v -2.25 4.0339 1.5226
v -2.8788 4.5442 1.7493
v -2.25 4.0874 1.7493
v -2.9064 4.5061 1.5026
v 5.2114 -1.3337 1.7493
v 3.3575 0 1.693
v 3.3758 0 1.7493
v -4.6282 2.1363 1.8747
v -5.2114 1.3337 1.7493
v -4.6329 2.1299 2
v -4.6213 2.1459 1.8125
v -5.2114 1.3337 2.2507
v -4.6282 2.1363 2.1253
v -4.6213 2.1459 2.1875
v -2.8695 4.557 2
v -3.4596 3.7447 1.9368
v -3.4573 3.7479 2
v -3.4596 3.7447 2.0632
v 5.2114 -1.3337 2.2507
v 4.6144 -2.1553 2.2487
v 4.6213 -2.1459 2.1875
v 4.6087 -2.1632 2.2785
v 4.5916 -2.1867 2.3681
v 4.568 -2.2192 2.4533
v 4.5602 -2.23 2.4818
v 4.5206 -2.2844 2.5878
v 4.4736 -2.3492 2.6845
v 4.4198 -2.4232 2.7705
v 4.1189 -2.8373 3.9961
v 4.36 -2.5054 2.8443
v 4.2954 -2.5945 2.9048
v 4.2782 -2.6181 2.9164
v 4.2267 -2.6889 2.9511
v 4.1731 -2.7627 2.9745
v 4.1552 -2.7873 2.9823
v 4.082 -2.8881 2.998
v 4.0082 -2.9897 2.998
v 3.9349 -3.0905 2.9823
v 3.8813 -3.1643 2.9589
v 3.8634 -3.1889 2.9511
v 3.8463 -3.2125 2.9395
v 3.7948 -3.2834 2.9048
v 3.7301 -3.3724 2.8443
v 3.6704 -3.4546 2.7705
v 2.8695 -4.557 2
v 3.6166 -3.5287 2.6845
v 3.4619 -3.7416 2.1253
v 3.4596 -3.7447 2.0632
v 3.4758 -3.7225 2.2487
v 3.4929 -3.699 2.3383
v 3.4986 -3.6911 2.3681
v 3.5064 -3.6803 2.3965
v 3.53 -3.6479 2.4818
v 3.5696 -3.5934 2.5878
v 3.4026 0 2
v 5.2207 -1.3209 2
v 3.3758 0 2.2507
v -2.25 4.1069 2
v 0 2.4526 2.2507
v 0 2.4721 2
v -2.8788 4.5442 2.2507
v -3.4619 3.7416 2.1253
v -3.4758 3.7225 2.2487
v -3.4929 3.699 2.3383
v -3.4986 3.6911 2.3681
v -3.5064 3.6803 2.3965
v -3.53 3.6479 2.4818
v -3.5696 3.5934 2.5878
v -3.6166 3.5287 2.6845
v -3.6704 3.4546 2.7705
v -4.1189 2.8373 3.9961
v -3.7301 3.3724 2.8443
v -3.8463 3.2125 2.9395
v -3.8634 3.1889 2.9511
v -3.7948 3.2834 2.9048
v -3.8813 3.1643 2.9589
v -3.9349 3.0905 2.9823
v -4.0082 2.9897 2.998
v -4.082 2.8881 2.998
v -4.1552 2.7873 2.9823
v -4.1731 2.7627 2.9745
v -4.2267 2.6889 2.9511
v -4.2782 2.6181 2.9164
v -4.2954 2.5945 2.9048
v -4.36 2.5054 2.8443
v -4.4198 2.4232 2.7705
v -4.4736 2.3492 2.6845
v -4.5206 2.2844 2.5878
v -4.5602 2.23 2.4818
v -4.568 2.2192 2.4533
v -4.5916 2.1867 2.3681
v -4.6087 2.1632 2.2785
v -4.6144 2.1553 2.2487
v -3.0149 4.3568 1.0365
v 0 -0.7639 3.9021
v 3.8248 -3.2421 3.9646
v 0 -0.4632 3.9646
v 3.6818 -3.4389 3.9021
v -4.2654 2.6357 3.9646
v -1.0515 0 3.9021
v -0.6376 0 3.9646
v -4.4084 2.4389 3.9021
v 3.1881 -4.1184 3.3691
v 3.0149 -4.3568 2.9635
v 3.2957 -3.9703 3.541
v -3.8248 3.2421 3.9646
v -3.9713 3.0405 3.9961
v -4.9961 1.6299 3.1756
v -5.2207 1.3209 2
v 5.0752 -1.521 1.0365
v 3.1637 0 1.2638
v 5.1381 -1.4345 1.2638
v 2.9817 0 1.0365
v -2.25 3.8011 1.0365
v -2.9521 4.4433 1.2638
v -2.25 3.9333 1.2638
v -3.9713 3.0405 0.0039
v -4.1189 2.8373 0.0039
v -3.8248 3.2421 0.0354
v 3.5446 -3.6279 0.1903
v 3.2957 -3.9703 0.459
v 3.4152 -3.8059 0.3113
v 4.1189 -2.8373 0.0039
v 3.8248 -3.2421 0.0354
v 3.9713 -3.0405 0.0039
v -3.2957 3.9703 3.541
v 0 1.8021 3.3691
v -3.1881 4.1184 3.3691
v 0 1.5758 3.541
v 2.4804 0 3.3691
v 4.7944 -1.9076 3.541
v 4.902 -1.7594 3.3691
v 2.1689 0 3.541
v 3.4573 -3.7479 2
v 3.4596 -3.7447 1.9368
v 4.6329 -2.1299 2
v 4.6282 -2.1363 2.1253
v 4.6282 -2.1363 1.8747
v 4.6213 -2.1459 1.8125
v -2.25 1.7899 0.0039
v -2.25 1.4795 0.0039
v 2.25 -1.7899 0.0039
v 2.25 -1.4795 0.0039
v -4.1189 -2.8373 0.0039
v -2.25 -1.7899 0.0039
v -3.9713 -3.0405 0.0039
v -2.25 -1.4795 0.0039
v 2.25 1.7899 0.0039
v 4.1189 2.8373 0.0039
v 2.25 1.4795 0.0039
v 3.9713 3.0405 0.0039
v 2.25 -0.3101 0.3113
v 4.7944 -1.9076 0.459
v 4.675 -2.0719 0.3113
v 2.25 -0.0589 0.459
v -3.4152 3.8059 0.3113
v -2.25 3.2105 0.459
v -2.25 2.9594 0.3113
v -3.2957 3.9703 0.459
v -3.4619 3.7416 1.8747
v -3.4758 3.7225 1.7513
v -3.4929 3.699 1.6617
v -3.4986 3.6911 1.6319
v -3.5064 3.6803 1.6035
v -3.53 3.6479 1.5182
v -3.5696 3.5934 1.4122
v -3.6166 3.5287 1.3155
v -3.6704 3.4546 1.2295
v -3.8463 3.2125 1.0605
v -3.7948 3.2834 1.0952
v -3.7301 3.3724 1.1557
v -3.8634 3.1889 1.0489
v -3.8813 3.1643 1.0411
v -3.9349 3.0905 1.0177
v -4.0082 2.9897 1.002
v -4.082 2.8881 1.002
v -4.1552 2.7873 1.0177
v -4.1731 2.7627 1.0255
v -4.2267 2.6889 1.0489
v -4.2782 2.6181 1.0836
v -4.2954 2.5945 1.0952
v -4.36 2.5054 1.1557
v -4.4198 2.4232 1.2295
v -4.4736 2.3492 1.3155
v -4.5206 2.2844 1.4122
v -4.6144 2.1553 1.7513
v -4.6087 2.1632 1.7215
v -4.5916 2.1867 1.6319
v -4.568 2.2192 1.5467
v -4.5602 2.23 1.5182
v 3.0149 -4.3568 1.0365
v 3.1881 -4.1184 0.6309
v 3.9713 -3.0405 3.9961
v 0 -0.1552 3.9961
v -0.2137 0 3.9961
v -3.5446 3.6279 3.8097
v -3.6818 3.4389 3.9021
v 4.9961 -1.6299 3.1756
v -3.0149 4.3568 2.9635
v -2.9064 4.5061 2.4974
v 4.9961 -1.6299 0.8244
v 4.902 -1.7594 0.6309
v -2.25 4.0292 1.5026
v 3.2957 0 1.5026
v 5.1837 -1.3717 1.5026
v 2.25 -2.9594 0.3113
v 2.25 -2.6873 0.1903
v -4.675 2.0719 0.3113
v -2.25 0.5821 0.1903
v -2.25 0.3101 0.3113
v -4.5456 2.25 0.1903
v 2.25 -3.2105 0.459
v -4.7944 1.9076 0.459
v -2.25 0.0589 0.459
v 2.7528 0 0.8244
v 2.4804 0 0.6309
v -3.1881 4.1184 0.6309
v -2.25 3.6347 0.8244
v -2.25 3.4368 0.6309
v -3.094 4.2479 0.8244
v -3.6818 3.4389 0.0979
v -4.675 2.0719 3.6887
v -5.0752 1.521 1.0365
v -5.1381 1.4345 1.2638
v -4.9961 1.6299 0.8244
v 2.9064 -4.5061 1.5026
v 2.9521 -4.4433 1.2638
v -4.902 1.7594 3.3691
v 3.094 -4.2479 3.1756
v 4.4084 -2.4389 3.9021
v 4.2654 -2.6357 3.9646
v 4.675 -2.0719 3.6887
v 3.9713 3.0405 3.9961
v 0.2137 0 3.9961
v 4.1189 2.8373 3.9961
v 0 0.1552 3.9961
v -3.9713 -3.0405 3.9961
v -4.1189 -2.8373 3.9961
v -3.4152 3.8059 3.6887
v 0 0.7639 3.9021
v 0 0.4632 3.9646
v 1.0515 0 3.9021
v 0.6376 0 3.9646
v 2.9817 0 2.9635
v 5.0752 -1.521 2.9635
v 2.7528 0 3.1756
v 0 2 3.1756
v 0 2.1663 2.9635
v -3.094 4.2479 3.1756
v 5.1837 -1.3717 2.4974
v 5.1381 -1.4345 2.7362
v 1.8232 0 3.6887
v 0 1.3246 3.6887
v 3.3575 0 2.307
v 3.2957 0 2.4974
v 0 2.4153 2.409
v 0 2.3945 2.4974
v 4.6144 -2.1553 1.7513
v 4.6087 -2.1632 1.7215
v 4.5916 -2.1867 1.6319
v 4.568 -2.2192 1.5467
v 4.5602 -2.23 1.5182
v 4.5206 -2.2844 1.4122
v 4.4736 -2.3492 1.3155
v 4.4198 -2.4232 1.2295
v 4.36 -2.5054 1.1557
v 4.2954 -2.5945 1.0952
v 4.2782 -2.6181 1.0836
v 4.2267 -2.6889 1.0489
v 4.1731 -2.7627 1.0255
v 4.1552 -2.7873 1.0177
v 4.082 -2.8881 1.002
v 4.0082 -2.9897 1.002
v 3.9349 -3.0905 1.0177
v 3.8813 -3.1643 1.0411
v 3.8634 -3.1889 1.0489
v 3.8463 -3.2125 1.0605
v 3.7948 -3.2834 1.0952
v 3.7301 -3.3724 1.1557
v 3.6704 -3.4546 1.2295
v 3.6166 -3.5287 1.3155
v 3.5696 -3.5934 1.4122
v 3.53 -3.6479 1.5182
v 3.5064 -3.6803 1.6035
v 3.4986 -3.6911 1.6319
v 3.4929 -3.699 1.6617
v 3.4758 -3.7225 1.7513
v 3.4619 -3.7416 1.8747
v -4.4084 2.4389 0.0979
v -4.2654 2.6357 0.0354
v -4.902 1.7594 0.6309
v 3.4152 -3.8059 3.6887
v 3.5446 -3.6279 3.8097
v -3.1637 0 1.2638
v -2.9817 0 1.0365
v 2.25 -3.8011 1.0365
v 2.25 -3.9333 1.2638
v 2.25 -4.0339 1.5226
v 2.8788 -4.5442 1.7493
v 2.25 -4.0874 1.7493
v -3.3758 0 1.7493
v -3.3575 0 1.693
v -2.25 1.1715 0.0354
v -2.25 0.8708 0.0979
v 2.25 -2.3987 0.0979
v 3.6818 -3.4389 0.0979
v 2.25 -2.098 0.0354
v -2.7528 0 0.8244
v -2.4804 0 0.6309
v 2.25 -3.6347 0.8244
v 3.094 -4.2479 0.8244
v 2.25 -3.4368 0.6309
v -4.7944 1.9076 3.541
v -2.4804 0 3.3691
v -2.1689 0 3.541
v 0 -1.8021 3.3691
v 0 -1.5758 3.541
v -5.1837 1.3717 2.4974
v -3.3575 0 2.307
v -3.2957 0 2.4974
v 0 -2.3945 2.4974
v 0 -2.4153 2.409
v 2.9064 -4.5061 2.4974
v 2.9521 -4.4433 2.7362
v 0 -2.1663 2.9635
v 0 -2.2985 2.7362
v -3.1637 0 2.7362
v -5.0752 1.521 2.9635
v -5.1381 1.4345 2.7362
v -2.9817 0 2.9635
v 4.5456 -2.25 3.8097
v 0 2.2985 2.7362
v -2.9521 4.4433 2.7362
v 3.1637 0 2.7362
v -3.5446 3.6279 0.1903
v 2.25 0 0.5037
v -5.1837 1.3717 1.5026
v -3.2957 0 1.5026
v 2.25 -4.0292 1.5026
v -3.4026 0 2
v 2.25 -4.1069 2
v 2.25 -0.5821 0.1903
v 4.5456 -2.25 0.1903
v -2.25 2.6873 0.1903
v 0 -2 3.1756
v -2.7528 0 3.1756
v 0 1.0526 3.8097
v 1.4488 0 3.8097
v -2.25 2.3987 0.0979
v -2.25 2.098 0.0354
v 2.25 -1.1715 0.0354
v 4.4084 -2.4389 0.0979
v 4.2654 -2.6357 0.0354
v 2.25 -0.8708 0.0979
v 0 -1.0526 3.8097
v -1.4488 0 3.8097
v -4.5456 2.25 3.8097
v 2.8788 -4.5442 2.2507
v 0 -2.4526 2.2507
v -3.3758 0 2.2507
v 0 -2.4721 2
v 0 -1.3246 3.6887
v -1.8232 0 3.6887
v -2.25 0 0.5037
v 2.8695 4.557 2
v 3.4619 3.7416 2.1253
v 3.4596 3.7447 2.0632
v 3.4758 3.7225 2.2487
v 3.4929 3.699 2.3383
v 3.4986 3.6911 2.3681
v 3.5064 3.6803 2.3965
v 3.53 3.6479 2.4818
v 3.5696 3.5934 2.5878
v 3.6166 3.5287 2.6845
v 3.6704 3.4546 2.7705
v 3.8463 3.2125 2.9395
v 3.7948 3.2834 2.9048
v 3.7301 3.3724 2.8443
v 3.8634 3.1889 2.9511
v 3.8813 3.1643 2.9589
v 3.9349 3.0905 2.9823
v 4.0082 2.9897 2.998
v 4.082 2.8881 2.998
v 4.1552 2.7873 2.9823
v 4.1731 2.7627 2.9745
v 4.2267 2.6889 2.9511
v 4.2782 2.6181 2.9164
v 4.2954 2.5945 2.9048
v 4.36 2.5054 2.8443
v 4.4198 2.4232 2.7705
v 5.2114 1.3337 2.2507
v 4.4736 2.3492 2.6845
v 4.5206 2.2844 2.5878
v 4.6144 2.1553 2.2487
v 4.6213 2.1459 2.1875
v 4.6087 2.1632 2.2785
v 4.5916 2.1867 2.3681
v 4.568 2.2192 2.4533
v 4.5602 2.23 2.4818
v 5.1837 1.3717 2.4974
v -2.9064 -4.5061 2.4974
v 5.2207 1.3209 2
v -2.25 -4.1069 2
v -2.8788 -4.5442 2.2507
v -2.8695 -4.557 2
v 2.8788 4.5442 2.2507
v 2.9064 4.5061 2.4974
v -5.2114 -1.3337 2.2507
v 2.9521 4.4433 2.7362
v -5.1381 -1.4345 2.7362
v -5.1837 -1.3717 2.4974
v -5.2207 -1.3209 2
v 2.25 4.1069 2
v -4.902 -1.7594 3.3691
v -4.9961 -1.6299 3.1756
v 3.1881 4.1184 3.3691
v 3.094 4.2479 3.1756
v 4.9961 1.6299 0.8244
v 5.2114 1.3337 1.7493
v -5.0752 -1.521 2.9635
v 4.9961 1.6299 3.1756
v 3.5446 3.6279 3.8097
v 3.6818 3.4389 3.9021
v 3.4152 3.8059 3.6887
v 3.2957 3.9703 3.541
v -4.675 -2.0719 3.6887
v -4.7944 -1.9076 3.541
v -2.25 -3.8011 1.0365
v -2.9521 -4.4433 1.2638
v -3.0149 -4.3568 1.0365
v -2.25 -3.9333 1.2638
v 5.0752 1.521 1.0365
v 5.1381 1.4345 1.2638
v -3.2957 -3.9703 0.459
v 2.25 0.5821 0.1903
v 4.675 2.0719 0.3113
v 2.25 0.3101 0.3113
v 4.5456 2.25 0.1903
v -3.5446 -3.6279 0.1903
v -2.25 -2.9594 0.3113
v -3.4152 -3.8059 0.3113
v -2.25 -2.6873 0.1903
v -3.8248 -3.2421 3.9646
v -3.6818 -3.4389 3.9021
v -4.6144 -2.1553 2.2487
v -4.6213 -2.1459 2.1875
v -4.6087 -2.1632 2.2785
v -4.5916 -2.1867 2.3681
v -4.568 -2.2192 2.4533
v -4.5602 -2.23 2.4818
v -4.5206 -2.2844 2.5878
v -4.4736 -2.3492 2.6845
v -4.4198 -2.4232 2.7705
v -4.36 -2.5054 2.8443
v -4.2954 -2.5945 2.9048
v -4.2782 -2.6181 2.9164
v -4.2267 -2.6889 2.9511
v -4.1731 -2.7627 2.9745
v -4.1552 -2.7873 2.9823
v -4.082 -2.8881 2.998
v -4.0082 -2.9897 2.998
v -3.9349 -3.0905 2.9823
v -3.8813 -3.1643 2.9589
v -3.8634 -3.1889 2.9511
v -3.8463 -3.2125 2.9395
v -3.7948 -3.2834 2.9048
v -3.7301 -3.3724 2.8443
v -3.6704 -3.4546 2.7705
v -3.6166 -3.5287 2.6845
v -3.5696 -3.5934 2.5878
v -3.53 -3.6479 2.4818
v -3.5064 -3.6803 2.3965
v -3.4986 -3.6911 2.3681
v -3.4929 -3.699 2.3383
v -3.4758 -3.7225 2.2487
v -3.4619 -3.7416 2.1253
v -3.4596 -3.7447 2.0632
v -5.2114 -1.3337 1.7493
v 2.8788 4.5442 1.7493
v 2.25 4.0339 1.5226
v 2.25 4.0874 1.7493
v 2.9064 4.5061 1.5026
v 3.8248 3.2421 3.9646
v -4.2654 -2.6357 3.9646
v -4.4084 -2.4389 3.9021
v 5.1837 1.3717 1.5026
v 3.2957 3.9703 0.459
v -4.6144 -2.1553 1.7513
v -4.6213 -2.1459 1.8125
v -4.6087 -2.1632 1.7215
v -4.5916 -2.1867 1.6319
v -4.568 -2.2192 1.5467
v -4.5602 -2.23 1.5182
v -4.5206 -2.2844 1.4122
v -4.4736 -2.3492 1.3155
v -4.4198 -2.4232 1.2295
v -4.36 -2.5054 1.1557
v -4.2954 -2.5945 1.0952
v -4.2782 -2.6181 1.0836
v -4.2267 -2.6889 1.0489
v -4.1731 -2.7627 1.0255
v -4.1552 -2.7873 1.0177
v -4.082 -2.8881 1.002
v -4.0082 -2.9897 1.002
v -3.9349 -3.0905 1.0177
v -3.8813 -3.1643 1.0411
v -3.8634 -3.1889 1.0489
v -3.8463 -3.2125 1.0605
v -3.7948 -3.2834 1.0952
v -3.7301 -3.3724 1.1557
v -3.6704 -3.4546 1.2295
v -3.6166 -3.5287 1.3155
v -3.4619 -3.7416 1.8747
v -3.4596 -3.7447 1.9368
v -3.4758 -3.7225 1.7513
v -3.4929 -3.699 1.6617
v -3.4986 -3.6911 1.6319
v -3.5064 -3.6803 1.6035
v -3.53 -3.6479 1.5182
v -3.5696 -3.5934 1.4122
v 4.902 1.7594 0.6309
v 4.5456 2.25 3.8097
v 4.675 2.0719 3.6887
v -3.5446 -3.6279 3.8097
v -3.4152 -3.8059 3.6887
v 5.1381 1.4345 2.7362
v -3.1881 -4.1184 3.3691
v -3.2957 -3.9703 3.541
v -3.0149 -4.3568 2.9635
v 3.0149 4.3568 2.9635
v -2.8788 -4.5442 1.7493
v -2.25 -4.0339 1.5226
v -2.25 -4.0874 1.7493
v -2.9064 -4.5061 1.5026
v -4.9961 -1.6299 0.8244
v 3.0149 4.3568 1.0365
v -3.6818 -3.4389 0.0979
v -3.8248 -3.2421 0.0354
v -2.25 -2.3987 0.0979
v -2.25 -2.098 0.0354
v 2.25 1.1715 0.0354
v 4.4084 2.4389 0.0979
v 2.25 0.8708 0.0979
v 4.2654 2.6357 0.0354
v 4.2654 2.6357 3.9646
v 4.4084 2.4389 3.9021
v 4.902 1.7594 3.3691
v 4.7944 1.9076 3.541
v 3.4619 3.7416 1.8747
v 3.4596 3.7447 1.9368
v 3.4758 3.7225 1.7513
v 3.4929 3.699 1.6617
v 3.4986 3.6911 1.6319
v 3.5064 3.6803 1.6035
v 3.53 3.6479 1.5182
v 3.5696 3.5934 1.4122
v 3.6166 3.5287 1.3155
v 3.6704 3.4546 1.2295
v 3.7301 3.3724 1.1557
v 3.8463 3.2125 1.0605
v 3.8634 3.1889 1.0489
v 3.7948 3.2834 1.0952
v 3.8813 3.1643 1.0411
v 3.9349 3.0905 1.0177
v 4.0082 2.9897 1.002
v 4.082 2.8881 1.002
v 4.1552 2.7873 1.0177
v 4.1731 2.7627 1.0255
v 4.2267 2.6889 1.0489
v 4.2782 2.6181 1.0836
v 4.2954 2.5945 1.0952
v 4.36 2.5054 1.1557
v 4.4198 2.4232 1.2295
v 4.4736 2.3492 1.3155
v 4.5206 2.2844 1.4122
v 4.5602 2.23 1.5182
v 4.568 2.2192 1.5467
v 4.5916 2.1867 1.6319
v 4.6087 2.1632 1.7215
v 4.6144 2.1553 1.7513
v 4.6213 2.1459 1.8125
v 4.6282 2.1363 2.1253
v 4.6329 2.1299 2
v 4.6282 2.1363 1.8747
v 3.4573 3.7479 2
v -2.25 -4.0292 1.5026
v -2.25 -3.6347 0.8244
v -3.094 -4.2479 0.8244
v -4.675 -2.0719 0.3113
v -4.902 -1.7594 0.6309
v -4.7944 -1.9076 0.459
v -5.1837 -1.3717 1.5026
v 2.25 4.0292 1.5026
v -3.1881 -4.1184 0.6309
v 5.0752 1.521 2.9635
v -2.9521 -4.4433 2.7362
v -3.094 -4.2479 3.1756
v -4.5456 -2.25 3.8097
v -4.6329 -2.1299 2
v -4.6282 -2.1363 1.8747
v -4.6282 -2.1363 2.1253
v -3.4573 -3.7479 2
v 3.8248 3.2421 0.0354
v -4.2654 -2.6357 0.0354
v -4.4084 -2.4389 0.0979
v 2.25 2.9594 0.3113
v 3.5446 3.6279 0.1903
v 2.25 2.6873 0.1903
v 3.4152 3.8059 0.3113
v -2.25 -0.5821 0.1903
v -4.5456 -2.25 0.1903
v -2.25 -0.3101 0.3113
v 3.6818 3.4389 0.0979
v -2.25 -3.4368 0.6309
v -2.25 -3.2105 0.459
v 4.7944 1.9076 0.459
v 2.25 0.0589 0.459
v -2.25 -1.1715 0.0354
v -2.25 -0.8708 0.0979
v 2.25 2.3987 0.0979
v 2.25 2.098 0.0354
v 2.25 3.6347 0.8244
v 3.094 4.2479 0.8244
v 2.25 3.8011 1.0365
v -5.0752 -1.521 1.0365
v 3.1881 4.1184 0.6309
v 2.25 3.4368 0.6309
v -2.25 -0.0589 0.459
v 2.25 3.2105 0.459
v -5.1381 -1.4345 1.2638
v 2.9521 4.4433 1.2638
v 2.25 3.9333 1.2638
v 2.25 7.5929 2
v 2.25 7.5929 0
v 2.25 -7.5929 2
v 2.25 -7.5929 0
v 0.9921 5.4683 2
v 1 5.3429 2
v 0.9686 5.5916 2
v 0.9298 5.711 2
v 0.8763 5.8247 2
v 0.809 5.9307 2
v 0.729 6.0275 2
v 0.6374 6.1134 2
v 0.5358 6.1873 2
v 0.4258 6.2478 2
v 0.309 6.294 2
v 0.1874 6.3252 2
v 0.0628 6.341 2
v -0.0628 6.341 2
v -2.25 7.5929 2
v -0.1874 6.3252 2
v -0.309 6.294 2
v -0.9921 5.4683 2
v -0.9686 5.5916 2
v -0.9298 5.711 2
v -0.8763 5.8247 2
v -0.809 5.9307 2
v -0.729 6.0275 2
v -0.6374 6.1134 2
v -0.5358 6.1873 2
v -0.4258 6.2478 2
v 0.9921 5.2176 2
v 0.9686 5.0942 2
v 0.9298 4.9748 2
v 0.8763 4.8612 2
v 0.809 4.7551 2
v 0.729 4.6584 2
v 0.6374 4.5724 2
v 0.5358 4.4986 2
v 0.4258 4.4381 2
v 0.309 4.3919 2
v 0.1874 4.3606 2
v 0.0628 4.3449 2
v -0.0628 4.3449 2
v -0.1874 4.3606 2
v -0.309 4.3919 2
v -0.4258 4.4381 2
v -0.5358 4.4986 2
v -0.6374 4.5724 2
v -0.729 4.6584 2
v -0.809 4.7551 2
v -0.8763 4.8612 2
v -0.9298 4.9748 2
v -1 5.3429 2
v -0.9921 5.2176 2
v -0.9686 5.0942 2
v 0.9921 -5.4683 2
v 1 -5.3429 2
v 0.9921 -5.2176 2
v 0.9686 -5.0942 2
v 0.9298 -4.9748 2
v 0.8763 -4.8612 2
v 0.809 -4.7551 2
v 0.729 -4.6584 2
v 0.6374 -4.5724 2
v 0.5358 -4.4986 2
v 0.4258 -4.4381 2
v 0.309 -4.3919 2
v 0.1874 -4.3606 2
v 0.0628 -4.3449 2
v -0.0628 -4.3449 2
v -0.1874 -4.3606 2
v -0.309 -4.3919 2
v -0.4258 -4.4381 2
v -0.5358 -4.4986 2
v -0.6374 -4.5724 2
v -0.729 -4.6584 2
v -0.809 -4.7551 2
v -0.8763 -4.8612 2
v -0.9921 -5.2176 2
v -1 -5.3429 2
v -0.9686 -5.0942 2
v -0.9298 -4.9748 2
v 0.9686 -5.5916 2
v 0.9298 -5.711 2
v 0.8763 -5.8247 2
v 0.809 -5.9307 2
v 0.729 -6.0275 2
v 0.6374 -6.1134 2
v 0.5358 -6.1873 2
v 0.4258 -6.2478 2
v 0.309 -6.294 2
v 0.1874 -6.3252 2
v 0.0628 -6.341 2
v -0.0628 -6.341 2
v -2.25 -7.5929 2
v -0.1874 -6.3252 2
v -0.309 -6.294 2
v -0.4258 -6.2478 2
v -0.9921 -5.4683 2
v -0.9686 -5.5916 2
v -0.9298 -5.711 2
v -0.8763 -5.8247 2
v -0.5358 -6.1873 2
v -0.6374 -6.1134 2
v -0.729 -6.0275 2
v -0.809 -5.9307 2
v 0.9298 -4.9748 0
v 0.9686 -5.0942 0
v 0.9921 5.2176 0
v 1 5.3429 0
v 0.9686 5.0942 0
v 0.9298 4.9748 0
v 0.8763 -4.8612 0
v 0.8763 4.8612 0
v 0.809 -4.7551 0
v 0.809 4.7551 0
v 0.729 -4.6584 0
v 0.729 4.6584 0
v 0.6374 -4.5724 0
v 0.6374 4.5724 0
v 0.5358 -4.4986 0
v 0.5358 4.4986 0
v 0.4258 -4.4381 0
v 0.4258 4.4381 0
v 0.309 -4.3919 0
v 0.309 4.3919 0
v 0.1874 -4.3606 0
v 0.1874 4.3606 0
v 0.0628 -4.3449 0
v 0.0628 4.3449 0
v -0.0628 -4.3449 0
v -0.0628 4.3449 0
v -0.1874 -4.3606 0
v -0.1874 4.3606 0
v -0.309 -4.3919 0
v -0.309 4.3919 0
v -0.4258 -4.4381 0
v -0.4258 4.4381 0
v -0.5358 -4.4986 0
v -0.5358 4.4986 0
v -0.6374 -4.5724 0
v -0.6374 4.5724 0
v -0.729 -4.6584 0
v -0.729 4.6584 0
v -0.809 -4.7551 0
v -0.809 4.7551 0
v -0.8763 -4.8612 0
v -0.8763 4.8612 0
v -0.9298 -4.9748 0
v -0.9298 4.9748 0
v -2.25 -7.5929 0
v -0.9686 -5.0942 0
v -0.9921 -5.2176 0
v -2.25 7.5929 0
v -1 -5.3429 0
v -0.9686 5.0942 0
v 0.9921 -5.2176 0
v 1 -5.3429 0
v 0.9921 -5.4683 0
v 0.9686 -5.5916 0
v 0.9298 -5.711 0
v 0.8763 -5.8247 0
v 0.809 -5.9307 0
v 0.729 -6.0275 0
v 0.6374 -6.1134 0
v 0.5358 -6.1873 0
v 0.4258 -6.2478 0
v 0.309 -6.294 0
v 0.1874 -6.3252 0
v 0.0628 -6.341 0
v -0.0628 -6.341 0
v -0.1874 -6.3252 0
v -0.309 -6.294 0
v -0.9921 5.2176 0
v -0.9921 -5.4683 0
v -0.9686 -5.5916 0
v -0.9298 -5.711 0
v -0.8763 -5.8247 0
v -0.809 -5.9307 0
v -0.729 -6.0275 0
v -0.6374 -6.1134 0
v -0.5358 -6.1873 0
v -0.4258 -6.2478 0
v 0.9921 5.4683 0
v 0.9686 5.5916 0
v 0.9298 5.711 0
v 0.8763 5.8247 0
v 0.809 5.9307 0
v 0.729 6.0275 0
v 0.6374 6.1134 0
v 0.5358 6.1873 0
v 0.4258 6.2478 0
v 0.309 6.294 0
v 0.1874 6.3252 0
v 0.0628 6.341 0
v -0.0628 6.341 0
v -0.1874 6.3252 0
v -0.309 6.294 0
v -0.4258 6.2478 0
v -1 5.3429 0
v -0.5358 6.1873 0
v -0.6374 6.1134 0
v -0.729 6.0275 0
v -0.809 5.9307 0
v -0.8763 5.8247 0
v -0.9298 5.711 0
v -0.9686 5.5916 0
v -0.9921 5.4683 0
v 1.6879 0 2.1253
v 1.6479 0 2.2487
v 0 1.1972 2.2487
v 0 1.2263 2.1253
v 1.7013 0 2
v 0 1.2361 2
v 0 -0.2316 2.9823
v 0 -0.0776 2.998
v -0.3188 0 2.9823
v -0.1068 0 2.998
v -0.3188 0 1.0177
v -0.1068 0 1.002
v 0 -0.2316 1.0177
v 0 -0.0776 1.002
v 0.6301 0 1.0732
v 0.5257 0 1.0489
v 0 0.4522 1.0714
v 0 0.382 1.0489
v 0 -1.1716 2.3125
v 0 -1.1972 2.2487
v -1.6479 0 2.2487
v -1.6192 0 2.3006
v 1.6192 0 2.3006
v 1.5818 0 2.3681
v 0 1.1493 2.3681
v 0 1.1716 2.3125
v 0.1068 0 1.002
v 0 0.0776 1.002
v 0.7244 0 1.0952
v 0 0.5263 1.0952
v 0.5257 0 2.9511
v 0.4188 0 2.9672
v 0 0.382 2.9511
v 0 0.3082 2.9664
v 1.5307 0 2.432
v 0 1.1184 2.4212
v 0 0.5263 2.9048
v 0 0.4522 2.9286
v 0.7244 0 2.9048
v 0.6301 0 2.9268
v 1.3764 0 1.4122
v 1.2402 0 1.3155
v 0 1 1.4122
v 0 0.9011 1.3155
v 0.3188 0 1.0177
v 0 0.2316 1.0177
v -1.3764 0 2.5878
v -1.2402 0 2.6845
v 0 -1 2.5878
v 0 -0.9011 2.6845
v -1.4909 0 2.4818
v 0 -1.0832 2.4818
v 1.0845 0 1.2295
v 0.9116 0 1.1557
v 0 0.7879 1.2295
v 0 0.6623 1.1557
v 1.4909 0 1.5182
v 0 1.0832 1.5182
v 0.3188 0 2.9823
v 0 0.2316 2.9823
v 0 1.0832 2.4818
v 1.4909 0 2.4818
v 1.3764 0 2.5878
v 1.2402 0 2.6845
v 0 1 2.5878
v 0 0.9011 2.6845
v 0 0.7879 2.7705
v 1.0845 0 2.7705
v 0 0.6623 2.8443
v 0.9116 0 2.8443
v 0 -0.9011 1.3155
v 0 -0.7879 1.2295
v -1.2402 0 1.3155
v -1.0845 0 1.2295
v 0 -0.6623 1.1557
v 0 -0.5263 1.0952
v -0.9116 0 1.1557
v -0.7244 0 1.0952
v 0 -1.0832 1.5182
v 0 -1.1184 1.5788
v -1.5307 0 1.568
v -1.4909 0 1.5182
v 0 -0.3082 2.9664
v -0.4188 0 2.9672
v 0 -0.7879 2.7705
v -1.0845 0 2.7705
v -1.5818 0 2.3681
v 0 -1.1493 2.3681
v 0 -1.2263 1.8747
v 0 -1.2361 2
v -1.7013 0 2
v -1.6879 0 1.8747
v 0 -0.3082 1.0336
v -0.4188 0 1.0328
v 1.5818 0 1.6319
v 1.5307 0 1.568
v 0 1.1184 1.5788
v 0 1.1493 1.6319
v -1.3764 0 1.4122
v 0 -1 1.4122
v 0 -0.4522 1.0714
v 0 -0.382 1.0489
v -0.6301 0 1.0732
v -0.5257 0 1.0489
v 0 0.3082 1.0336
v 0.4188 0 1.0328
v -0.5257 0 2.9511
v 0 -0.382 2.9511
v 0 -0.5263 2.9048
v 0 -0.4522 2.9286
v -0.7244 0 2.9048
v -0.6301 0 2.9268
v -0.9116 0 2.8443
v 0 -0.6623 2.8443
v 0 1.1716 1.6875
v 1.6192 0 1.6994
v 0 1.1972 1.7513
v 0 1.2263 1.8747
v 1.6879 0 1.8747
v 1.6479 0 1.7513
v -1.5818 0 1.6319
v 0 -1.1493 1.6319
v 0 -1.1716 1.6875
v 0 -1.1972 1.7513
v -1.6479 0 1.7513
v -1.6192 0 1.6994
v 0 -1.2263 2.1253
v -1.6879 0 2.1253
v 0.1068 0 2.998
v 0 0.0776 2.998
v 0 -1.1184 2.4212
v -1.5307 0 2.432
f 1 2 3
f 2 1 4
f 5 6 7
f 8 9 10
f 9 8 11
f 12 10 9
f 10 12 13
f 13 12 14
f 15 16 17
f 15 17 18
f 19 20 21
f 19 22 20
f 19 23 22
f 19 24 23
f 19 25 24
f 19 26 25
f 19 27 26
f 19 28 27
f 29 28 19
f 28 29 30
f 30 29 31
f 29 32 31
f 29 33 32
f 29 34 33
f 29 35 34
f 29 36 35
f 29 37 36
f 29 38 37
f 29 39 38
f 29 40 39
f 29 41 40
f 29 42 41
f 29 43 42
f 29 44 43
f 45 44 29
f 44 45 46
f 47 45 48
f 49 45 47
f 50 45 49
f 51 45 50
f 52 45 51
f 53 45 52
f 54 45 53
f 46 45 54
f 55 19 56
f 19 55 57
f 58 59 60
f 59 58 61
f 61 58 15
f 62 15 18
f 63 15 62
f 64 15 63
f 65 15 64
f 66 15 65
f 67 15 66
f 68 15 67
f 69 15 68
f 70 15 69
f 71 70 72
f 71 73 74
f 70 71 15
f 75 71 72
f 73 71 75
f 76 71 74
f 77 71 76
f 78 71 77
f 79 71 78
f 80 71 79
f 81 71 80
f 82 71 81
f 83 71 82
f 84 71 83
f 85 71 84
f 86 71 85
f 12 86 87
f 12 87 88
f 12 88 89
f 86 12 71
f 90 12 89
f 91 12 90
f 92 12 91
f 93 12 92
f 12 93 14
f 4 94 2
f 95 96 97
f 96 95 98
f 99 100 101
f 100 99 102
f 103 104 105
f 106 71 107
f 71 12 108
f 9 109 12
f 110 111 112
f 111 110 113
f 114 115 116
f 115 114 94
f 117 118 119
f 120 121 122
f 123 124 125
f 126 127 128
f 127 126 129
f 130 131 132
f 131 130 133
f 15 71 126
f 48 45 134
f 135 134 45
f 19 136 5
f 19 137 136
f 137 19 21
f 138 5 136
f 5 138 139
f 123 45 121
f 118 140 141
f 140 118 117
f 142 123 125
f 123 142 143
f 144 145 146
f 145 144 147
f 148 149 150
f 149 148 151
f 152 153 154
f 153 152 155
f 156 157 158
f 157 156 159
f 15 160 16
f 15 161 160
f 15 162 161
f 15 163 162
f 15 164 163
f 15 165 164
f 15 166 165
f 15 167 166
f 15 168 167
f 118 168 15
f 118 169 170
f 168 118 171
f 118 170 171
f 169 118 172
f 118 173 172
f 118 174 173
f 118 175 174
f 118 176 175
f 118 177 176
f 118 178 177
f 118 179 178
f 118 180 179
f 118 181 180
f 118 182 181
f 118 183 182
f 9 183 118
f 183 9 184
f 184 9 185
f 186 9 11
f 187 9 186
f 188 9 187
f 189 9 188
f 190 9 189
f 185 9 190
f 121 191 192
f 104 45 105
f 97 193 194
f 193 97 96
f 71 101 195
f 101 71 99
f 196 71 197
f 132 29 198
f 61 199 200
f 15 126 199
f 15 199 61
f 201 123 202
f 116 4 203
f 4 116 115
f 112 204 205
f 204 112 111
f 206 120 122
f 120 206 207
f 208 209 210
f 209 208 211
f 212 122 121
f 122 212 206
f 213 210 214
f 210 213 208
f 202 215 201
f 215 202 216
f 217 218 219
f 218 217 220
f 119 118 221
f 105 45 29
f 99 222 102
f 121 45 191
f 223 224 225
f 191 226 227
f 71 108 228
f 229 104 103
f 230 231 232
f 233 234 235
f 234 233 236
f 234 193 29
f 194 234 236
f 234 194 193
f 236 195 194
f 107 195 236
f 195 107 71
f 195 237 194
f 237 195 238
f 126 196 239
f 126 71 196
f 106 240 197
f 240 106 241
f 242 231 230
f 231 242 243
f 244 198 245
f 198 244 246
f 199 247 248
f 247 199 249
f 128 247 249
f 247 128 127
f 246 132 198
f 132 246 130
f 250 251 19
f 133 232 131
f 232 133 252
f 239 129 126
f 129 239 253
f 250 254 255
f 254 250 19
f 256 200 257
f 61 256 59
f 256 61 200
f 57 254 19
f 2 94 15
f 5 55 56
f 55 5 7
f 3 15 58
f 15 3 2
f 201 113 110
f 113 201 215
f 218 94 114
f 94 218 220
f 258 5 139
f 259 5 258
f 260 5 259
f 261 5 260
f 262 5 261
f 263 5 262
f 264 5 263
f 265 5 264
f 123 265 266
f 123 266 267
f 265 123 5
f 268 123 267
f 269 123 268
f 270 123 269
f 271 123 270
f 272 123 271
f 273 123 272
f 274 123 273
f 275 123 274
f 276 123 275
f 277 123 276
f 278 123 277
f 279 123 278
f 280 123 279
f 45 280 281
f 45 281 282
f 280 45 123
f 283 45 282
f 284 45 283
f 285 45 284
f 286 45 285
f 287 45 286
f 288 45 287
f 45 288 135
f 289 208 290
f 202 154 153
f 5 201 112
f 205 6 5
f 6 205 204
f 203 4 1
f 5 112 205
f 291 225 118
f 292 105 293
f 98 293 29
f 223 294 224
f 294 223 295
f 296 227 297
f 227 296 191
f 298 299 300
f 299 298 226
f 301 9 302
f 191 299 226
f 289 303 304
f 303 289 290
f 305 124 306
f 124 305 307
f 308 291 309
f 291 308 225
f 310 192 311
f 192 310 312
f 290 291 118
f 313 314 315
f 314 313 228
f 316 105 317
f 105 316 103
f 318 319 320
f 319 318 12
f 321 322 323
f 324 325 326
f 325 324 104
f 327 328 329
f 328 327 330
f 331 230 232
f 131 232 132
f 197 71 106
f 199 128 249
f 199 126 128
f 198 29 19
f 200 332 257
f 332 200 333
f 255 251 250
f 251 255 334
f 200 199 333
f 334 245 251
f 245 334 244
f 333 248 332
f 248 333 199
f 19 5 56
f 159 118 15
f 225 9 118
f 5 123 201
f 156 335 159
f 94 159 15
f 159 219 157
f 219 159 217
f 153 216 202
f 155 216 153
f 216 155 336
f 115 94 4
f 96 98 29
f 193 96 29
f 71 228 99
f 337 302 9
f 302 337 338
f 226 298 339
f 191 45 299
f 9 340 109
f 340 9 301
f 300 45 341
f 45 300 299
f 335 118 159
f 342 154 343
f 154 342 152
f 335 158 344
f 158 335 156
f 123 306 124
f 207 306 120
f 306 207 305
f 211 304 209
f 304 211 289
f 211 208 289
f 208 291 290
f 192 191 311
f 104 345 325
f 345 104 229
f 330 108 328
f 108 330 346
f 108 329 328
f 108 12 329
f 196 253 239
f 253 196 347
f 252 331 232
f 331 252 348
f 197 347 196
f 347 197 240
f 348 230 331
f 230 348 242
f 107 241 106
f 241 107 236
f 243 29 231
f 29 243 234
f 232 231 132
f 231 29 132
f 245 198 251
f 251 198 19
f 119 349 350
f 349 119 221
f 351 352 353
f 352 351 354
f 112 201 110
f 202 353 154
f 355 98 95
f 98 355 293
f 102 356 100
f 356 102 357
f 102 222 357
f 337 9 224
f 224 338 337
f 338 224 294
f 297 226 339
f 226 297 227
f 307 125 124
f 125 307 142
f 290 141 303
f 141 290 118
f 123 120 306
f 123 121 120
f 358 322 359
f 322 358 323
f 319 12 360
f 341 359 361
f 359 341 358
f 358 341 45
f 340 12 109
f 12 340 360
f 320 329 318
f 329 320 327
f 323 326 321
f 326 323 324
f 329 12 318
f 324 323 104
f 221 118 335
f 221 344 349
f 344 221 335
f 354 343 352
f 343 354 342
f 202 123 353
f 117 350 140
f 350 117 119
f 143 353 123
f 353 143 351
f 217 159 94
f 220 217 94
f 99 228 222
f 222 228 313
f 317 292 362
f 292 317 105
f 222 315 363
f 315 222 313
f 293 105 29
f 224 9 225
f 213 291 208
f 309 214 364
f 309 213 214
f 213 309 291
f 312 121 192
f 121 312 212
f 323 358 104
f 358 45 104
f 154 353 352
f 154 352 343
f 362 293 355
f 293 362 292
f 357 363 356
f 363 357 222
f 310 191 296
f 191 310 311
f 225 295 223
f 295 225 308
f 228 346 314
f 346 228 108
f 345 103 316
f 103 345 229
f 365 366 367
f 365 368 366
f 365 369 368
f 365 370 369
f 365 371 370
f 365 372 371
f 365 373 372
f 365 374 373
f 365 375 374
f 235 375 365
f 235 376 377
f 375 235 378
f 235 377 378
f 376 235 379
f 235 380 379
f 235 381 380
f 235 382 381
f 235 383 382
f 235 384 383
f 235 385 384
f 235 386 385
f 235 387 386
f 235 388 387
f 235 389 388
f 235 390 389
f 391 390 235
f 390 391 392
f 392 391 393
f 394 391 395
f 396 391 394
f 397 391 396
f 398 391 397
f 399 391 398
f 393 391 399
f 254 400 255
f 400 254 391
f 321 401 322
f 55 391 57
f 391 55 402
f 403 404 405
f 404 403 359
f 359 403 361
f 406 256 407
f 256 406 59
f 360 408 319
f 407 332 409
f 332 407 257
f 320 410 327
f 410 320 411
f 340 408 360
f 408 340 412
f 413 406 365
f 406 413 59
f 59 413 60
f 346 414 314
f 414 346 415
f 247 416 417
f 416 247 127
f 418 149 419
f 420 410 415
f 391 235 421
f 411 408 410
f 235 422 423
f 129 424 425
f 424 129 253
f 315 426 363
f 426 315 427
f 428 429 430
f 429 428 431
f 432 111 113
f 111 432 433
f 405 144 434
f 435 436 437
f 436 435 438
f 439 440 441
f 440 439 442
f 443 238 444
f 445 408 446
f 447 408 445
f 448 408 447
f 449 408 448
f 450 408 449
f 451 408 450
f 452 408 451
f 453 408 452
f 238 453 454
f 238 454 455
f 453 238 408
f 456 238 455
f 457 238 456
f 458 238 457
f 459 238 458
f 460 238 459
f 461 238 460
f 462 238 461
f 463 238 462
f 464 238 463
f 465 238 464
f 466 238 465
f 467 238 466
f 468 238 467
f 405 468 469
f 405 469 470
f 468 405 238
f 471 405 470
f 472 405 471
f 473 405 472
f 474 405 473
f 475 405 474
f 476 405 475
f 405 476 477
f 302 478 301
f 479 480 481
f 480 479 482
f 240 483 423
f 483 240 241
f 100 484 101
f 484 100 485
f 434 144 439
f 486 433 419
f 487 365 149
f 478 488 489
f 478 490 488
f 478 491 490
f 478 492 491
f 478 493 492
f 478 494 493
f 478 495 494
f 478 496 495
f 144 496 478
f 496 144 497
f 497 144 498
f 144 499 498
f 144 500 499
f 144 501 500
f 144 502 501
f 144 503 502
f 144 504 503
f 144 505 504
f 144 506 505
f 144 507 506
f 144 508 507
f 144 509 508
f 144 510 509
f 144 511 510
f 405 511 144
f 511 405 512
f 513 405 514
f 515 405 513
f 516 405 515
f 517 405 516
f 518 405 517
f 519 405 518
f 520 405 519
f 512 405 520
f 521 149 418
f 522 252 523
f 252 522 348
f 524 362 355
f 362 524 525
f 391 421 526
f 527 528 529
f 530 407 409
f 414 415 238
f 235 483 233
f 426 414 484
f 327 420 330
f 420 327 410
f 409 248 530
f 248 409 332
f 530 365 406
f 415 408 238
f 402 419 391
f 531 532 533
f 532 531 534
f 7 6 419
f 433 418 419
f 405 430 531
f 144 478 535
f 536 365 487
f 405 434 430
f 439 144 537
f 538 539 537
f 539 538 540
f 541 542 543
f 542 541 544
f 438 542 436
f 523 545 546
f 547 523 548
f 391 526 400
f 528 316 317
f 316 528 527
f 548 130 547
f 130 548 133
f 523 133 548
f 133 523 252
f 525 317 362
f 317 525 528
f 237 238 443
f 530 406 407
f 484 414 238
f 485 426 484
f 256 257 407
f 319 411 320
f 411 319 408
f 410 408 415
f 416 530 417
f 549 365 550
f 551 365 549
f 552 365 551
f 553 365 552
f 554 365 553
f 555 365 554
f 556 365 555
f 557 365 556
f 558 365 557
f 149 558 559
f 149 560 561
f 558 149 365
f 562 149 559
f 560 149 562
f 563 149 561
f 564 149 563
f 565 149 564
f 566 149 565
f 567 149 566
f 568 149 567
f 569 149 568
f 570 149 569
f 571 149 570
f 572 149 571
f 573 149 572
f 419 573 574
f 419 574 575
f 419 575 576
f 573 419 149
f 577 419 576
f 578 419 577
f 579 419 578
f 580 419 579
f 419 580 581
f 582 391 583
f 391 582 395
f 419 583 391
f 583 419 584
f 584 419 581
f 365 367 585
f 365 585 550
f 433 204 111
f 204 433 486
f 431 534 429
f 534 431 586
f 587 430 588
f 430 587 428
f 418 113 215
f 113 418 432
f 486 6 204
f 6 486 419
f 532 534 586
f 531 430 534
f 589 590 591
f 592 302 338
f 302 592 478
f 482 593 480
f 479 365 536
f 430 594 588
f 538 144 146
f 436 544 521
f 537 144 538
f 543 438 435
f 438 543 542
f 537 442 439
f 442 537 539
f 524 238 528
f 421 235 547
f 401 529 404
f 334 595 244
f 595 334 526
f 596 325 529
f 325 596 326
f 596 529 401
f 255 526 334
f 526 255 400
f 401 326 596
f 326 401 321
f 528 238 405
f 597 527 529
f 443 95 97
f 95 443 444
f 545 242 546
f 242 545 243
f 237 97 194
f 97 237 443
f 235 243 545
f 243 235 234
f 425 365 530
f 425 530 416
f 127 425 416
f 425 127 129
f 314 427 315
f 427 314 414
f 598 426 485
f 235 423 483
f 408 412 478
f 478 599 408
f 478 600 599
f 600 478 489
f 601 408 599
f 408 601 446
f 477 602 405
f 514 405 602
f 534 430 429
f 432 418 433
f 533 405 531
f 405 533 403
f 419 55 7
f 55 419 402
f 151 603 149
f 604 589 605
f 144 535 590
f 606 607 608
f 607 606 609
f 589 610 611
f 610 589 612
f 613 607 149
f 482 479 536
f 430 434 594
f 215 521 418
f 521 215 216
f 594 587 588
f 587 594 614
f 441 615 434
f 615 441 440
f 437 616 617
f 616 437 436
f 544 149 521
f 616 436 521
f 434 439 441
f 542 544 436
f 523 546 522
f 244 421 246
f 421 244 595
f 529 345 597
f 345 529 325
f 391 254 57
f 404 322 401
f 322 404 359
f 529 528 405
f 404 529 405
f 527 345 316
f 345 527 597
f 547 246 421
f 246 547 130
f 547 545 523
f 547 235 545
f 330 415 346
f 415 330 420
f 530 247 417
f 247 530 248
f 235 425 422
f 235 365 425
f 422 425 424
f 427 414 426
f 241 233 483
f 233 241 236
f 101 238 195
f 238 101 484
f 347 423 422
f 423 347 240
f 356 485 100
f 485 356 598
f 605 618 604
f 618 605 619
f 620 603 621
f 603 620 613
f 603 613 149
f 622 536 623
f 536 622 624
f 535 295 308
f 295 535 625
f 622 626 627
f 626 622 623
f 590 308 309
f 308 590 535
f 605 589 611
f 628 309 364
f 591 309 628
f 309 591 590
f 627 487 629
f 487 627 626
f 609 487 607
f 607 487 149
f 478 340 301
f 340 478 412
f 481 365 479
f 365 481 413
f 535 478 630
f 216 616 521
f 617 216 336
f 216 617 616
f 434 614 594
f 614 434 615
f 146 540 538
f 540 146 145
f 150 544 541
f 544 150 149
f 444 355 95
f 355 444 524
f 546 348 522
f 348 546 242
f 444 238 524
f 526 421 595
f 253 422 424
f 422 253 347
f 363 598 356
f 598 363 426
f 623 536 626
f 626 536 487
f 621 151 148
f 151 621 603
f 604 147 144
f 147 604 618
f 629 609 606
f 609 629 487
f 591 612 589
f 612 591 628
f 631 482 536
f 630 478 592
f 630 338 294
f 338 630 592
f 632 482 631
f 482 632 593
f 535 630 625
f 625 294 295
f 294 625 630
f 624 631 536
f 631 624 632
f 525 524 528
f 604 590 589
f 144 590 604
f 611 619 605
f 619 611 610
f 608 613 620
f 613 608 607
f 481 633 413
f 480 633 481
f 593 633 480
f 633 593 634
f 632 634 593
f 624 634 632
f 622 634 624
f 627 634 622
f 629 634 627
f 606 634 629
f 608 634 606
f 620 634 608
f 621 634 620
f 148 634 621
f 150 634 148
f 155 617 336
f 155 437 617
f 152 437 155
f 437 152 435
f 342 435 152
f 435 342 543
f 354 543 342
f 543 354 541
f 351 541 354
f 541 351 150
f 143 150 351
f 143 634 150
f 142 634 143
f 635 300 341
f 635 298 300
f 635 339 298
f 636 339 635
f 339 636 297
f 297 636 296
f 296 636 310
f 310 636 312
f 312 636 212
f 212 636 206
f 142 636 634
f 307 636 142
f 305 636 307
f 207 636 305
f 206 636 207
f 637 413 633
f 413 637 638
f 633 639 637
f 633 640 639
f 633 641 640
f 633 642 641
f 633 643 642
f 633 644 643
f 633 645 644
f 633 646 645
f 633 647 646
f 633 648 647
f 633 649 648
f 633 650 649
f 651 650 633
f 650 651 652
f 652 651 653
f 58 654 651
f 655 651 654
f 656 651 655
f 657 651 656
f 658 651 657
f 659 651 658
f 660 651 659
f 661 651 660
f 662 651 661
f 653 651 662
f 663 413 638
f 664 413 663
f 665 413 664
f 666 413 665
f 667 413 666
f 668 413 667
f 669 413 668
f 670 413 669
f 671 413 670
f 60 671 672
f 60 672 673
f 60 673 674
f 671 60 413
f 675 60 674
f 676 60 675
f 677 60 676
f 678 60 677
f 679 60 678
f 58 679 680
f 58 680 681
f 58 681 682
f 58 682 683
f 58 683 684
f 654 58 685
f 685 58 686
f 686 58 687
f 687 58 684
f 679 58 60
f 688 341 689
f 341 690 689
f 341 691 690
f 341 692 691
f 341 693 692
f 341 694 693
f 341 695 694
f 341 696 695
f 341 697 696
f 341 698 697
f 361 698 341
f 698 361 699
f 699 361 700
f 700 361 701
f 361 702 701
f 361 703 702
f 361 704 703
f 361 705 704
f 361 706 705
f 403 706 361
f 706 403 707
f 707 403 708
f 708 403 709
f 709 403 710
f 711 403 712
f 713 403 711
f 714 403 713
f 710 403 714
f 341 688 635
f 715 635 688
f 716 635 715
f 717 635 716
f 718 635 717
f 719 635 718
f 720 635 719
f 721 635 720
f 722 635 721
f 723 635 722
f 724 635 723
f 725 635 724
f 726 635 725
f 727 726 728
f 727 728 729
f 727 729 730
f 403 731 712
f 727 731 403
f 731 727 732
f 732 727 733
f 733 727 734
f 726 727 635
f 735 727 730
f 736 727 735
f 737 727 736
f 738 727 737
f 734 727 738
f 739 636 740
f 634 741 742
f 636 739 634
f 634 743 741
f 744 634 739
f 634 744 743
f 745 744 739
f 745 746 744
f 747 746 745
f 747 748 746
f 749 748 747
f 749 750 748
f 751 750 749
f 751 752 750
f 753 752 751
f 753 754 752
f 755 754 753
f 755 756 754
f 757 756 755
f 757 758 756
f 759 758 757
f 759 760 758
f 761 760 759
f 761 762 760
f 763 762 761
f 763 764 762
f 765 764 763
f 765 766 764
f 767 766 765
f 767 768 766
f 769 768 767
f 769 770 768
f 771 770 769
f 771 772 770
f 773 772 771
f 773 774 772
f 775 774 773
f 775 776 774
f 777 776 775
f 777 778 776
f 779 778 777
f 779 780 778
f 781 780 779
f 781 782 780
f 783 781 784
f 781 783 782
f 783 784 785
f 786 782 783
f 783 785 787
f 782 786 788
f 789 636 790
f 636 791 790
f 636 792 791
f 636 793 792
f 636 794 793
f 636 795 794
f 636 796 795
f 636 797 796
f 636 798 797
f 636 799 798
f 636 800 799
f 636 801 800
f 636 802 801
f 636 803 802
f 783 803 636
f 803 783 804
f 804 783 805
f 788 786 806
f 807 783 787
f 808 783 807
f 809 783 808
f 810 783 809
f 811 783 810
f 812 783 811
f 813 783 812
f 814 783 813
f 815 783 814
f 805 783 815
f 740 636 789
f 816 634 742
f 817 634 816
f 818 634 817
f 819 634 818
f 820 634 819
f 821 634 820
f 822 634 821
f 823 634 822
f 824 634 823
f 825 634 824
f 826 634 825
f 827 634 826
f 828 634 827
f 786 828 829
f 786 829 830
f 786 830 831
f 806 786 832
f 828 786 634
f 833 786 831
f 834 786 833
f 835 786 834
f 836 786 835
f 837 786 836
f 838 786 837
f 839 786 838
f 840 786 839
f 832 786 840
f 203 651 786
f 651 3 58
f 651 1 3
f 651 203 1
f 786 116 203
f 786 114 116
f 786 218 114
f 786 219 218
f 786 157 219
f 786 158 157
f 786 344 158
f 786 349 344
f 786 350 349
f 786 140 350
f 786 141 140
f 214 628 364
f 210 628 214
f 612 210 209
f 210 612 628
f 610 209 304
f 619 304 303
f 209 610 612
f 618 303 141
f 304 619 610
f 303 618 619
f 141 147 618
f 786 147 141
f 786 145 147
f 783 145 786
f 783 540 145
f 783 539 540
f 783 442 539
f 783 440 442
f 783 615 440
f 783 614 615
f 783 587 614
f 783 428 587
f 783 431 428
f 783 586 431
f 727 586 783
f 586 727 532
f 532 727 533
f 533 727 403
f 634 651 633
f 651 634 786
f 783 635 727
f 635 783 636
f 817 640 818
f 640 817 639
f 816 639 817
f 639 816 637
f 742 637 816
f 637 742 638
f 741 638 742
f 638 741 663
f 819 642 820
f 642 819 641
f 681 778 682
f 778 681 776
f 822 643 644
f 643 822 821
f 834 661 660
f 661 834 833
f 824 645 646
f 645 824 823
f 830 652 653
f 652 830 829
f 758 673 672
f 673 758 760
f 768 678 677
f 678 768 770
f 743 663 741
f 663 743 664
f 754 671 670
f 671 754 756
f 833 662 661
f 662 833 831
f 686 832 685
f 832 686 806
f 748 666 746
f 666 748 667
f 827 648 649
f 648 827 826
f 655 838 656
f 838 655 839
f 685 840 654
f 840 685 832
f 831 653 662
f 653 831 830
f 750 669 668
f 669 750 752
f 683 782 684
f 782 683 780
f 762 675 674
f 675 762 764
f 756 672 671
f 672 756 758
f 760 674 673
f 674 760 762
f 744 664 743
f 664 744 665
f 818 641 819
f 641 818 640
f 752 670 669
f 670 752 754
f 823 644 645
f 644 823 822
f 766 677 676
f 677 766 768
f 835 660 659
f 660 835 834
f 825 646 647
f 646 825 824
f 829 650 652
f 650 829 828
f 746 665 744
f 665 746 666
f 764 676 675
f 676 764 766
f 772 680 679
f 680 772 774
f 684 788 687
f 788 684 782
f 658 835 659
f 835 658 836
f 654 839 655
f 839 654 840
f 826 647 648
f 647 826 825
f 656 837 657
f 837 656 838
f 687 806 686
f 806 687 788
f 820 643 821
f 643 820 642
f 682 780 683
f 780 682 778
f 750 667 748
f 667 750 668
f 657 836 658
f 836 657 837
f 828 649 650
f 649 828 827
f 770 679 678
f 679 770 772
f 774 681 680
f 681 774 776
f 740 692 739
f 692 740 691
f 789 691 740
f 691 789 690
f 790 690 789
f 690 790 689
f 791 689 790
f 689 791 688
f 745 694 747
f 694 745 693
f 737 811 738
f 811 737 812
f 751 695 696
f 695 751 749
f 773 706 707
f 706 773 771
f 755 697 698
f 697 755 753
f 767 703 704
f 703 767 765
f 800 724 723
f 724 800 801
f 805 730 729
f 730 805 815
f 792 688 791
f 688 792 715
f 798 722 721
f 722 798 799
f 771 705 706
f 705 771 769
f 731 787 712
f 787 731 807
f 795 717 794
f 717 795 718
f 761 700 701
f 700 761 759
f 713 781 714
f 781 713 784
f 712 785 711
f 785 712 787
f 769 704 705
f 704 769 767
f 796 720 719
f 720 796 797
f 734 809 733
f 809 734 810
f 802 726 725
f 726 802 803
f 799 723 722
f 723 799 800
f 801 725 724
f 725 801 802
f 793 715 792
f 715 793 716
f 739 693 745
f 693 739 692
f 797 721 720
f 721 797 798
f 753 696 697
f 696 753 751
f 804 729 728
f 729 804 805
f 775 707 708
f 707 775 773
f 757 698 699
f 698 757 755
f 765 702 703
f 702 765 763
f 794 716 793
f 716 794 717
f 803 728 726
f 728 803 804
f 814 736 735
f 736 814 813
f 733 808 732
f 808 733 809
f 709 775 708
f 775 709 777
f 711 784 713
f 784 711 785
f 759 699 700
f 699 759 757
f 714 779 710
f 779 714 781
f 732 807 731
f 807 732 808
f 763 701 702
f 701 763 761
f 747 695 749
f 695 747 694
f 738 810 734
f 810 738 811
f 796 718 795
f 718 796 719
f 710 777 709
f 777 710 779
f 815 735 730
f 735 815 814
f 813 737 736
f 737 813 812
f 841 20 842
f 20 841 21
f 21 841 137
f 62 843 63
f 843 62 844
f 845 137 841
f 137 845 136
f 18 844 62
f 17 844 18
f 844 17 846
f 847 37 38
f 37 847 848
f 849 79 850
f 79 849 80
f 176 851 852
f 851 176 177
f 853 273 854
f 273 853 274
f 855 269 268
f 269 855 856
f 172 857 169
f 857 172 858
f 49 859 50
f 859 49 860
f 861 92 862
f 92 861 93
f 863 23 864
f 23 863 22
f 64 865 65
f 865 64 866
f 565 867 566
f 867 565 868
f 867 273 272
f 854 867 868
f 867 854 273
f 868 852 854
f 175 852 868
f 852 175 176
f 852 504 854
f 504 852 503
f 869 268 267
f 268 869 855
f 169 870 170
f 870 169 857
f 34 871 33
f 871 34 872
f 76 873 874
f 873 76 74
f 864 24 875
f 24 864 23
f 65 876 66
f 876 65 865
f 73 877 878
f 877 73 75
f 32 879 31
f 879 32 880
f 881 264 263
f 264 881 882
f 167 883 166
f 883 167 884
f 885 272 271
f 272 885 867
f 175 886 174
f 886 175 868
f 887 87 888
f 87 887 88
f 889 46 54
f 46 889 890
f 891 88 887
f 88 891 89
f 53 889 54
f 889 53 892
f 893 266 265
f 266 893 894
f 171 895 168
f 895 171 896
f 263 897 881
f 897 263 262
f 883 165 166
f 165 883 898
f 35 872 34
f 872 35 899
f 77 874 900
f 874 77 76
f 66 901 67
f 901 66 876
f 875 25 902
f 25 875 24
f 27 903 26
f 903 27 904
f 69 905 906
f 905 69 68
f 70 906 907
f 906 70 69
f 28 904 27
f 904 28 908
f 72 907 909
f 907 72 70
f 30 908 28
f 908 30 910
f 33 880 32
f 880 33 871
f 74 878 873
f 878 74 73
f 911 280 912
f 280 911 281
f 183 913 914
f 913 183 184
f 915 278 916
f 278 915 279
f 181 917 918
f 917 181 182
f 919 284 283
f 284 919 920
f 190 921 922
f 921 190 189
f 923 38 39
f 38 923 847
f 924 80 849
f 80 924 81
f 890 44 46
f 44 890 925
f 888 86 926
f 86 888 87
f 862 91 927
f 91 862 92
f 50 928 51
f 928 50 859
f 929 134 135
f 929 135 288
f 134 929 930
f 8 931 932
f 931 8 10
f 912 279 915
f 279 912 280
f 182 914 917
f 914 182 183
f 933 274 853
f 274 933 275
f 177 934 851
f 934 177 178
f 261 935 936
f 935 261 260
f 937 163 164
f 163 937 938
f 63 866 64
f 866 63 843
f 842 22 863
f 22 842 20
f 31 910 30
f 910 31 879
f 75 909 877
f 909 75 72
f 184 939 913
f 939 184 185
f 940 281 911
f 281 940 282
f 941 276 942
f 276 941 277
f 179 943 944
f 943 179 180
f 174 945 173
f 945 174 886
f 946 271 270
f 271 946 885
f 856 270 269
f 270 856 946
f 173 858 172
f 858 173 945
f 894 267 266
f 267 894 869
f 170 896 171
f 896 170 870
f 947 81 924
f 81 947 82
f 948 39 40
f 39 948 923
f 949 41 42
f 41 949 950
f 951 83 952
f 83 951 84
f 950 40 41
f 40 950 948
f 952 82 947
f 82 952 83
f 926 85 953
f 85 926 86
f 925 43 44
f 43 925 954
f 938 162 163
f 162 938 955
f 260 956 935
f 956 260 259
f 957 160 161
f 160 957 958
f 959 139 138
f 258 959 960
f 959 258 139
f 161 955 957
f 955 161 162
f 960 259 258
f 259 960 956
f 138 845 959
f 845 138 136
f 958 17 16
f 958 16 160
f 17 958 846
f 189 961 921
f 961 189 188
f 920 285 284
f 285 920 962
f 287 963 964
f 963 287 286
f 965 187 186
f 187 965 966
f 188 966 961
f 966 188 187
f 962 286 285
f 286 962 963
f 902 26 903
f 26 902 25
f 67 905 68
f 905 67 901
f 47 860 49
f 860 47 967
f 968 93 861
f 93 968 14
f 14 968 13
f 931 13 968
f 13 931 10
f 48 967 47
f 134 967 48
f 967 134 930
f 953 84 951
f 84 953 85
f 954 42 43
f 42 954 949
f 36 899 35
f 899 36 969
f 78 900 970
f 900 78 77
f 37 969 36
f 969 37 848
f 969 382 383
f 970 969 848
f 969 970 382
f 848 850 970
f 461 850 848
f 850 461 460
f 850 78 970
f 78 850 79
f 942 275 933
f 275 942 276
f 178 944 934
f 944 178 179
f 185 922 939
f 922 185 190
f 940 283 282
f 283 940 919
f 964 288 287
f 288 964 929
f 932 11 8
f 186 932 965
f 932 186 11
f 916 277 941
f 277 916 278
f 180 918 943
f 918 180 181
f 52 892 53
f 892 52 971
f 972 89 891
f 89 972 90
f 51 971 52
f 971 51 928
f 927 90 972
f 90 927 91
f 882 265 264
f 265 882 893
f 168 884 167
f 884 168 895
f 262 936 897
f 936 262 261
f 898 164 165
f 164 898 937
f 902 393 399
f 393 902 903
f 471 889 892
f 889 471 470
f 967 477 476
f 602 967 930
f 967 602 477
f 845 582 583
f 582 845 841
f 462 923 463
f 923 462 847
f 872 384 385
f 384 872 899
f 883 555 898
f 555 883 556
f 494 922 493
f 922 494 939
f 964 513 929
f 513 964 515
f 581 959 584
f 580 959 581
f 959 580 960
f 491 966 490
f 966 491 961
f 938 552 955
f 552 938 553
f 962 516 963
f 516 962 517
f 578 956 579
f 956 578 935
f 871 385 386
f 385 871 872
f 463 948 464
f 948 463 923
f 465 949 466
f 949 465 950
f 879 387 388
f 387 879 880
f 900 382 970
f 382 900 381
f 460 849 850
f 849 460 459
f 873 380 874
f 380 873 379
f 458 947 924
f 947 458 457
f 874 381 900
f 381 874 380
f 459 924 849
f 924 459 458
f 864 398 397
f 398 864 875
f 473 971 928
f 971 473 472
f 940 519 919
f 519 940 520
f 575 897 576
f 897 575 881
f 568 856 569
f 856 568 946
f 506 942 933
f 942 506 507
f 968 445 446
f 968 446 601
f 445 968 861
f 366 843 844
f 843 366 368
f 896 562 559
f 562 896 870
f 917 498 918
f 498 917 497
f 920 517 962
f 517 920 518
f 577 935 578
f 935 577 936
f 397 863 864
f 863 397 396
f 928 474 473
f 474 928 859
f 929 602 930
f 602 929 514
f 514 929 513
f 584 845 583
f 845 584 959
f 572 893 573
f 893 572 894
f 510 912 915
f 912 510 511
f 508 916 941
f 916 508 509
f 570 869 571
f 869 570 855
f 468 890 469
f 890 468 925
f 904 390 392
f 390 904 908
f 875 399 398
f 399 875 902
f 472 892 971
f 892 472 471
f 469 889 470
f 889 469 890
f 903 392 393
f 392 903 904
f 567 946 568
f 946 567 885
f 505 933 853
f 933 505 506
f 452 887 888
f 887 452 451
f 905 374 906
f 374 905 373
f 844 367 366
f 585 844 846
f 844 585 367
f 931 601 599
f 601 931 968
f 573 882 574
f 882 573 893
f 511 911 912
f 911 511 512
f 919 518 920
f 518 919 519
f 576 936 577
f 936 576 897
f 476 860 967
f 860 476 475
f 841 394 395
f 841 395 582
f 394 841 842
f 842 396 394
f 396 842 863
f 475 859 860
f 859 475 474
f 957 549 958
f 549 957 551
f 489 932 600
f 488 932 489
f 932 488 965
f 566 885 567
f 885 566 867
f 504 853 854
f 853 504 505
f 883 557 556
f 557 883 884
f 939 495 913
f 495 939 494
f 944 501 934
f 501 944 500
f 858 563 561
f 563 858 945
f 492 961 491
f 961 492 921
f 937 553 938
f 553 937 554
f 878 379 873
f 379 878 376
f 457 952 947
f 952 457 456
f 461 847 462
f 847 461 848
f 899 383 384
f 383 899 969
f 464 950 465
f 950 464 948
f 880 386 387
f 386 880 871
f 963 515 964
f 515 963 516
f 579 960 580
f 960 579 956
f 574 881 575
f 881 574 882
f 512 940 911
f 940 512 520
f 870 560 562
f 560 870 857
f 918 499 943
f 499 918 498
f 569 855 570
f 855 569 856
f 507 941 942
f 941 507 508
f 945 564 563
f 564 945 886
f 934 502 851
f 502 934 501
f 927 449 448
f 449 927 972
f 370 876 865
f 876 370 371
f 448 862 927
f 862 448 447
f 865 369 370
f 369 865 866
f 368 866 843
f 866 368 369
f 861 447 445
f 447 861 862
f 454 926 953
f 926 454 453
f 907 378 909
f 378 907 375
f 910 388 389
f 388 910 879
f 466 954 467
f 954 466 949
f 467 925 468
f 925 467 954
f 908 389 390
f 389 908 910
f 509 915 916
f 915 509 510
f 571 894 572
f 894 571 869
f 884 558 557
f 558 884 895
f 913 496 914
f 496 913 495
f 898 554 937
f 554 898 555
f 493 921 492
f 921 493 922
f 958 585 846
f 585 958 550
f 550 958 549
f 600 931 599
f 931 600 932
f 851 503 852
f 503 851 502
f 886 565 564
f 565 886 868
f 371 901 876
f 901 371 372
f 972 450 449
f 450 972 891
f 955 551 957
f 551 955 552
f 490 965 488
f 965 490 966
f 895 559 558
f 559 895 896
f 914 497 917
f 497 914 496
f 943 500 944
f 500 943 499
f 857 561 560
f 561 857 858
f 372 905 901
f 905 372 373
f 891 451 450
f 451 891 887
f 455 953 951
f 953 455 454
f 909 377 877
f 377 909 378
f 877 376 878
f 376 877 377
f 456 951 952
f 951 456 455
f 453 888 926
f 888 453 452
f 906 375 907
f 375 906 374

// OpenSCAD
// file: screw-ring.scad
include <parameters-nylonshape.scad>;

module screwholder(screw_diameter, nut, nut_l, ring_strength, rail_strength, diameter,distance)
{	
	difference()
	{


		translate([0,0,ring_strength/2])
		cube([nut_l, 2*distance + nut_l, ring_strength], center=true);

		translate([0,distance,0])	
		cylinder(h= ring_strength, r= screw_diameter/2, $fn=50);

		translate([0,- distance,0])	
		cylinder(h= ring_strength +2, r= screw_diameter/2, $fn=50);

	}
}


screwholder(screw_diameter, nut, nut_l, ring_strength, rail_strength, diameter,distance);
// file: x-rail.scad
include <parameters-nylonshape.scad>;

module x_cutout(diameter, length, angle)
{
	union()
	{
		rotate([90,0,angle/2])
		cylinder(r=diameter/2, h=length*2, center=true, $fn = 50);

		rotate([90,0,-angle/2])
		cylinder(r=diameter/2, h=length*2, center=true, $fn = 50);
	}

}


module x_rails(diameter, length, angle, rail_strength)
{
	union()
	{
		rotate([90,0,angle/2])
		cylinder(r=diameter/2 + rail_strength, h=length, center=true, $fn = 50);

		rotate([90,0,-angle/2])
		cylinder(r=diameter/2 + rail_strength, h=length, center=true, $fn = 50);
	}

}


difference()
{
	x_rails(diameter, length, angle, rail_strength);
	x_cutout(diameter, length, angle, rail_strength);
}
// file: parameters-nylonshape.scad
//P
//Parameters for nylonrail
//P

// diameter of nylonrail
diameter = 2;
// length of nylonrail
length = 10;
// number of rails (5 corner star -> 5 rails)
number = 5;
// angle between two rails
angle = ((number-2)*180)/number;
//strength of screw rings
ring_strength = 2;
//strength of nylon rails
rail_strength = 1;


//M
//Screw Measurements
//M
//M2 screw, for better hold decrease slightly
screw_diameter = 2;
//smallest diameter of nut
nut = 4;
//largest diameter of nut
nut_l=4.5;

//P
//Parameters for screw ring placement
//P

//with center at the crossing of the two rails,
//this is the distance of the center of the screw ring:

//distance = tan(90-angle/2) * 2 * sin(90-angle/2) / (rail_strength*2+diameter);
betta = 90-angle/2;
total_diameter = 2*ring_strength + diameter;
distance = tan(betta)*( (total_diameter)/sin(betta)+ nut_l)/2;
// main file
include <parameters-nylonshape.scad>;
use <x-rail.scad>;
use <screw-ring.scad>;

module nylonshape(screw_diameter, nut, nut_l, ring_strength, rail_strength, diameter, length, angle)
{
difference()
	{
		union()
		{
			//move to positive z-axis values
			translate([0,0,diameter/2 + rail_strength])
			x_rails(diameter, length, angle, rail_strength);

			screwholder(screw_diameter, nut, nut_l, ring_strength, rail_strength, diameter,distance);					

		}
	
		//move to positive z-axis values
		translate([0,0,diameter/2 + rail_strength])
		x_cutout(diameter, length, angle, rail_strength);
	}
}




//screwholder(screw_diameter, nut, nut_l, ring_strength, rail_strength, diameter,distance);
//cutout_screwholder(ring_strength, nut_l, distance);
nylonshape(screw_diameter, nut, nut_l, ring_strength, rail_strength, diameter, length, angle);
